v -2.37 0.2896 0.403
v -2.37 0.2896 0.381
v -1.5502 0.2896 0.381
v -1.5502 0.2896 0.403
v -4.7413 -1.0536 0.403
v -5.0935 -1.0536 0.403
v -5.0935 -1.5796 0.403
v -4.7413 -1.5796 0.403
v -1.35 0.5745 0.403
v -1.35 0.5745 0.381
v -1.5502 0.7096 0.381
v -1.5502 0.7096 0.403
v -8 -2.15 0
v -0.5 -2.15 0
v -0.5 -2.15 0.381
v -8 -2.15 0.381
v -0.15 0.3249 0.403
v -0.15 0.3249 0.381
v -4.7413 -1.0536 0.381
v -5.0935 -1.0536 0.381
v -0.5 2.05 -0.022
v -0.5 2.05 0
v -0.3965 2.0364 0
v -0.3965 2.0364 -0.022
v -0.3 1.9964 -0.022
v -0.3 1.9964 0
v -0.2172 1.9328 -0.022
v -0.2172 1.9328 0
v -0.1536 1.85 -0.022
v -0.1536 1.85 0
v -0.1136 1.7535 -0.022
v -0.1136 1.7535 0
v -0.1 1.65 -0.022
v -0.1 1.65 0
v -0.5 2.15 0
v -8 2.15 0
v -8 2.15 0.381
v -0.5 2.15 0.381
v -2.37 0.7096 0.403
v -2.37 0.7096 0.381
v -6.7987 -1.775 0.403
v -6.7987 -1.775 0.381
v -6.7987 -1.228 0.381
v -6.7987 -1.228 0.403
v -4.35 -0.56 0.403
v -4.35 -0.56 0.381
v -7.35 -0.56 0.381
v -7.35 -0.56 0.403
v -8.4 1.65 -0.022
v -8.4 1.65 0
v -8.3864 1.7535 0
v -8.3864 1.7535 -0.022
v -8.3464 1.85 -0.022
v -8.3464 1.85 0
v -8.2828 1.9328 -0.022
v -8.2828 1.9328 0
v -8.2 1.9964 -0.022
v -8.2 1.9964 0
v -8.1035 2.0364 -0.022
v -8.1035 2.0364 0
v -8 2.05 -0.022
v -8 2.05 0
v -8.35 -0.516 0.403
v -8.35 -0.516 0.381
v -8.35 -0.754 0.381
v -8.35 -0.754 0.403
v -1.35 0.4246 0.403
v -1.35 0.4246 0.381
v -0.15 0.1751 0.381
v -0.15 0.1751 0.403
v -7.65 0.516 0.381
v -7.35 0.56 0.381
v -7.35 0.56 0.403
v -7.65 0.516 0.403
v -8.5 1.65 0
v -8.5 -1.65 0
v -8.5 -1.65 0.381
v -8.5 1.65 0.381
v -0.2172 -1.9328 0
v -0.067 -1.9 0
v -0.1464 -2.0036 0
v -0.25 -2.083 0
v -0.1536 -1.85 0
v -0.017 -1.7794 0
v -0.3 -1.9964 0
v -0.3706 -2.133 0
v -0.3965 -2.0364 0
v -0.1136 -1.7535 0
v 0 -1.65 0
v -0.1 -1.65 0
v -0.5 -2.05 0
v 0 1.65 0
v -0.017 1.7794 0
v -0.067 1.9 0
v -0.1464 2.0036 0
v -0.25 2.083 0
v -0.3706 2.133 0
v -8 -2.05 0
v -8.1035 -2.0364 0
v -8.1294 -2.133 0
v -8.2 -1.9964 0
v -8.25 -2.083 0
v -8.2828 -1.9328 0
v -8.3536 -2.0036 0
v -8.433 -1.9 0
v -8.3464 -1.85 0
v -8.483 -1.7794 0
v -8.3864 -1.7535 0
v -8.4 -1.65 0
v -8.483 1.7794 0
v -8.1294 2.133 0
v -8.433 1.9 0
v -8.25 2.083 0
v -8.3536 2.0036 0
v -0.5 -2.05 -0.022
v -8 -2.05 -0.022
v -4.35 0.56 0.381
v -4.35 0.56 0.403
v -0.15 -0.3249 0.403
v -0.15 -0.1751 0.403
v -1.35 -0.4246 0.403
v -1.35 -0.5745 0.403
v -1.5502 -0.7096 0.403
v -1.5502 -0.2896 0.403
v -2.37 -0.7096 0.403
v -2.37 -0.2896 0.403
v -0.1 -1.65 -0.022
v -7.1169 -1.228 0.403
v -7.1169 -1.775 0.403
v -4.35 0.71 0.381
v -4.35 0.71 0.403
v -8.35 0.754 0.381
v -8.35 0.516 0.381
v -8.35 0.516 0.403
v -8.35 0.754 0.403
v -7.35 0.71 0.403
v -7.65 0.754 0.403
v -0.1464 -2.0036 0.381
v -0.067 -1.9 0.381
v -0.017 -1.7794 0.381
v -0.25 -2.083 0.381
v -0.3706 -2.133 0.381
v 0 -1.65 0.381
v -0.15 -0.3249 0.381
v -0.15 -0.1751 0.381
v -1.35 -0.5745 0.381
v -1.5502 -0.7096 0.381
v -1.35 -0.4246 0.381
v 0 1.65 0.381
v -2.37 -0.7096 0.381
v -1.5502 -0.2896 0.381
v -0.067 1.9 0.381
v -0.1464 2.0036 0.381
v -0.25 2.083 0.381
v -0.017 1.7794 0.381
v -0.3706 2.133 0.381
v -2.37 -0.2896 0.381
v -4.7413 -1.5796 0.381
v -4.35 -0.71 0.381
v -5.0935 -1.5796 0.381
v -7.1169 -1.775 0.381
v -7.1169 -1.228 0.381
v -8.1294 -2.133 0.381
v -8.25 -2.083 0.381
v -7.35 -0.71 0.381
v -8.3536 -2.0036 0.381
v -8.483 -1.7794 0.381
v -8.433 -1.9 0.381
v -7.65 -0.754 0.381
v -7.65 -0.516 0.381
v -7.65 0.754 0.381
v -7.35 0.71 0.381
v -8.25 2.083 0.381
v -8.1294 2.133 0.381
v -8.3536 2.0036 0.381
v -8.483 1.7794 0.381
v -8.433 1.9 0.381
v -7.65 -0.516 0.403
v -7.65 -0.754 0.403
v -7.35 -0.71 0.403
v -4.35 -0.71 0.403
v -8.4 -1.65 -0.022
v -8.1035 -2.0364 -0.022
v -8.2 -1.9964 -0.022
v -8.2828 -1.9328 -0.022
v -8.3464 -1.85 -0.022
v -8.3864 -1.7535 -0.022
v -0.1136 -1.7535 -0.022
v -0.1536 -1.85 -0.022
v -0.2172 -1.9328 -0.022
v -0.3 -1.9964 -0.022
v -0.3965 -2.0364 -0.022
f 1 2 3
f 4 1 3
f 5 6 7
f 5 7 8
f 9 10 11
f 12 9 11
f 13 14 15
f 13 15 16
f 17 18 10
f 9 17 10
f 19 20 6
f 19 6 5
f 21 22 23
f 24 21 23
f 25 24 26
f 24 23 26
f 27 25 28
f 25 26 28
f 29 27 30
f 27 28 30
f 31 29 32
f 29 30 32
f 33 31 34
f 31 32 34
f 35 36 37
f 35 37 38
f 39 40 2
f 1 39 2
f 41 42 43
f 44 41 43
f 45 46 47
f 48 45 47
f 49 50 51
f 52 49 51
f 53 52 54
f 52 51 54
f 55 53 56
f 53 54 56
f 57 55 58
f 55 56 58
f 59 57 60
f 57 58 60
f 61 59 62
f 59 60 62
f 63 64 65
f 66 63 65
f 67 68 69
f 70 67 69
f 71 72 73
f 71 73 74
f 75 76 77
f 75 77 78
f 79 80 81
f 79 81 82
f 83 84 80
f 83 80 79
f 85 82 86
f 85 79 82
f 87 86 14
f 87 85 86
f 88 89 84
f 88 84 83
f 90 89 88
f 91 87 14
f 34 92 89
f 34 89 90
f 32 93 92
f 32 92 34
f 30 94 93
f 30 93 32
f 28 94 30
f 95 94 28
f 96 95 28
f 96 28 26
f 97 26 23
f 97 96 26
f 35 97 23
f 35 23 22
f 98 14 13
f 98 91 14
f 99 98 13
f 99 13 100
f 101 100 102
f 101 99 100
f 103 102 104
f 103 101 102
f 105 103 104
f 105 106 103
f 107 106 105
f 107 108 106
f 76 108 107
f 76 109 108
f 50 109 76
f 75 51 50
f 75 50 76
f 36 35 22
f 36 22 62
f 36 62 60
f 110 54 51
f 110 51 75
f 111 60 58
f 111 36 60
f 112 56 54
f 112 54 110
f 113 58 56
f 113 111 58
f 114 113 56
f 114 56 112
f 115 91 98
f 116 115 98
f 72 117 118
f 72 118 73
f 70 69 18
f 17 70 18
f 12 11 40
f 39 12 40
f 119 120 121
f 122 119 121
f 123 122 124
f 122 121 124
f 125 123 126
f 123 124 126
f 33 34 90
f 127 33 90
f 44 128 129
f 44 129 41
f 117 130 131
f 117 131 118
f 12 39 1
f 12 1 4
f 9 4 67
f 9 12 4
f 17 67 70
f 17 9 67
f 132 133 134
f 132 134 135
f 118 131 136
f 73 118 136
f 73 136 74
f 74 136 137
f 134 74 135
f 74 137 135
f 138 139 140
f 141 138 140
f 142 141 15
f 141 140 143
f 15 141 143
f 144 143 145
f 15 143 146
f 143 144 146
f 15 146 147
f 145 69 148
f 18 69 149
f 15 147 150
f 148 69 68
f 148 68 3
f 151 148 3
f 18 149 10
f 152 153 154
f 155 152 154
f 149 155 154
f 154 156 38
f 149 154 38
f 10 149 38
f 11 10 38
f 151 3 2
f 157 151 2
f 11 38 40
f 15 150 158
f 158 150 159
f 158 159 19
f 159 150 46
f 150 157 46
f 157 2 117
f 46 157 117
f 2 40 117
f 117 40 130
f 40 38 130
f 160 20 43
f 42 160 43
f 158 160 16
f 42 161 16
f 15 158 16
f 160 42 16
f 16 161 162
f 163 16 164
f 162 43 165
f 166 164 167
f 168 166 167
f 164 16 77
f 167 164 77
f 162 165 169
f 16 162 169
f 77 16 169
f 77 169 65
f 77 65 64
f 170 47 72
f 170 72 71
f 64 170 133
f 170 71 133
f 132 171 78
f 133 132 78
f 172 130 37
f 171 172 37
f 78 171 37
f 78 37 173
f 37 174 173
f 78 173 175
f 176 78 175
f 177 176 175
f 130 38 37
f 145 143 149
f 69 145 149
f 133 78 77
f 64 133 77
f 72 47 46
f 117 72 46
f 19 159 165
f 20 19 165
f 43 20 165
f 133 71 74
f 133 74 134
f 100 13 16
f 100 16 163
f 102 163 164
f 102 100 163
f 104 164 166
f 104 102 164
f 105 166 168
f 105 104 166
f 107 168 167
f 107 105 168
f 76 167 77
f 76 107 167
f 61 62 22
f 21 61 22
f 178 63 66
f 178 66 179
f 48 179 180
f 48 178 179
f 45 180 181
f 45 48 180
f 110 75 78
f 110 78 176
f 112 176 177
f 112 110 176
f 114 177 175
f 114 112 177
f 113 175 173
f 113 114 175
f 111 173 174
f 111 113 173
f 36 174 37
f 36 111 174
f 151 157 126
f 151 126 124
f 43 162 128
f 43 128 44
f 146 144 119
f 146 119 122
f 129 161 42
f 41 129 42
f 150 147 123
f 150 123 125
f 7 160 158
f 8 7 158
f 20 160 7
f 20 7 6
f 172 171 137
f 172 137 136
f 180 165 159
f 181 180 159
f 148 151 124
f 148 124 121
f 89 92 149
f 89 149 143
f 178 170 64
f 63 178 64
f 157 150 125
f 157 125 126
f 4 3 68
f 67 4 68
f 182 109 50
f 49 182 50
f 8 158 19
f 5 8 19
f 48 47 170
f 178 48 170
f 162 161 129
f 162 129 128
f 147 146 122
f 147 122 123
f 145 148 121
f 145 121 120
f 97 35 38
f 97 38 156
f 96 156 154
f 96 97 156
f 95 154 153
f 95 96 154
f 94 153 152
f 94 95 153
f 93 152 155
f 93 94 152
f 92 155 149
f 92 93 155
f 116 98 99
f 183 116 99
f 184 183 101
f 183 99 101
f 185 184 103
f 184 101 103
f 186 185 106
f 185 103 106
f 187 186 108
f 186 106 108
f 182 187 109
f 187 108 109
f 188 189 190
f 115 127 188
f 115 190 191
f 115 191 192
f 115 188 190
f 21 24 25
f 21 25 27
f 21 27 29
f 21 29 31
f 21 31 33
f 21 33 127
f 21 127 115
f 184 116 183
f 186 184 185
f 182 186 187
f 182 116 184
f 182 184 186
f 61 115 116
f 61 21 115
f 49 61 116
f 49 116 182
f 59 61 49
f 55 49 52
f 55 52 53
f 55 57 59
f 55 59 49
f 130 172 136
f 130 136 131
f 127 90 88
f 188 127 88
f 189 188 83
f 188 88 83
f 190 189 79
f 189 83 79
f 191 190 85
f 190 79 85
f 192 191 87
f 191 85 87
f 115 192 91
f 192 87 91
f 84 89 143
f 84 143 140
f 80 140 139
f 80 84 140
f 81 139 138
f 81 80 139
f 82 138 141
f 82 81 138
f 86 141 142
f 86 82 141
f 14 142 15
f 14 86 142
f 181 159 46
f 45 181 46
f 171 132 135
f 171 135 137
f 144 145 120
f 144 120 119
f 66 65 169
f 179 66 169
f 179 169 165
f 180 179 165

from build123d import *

# Parameters (mm, degrees)
BE_00_BOARD_DEPTH   = 0.381
SKETCH2_W           = 0.318200966
SKETCH2_H           = 0.54698776
SKETCH2_W_2         = 0.352186611
SKETCH2_H_2         = 0.526038031
BE_00_TRACES_DEPTH  = 0.022
BOSS_EXTRUDE1_DEPTH = 0.022


with BuildPart() as part:
    # Sketch1 → BE-00 Board (new body)
    with BuildSketch(Plane.XY):
        with BuildLine():
            Line((-8, 2.15), (-0.5, 2.15))
            ThreePointArc((-0.5, 2.15), (-0.146446609, 2.003553391), (0, 1.65))
            Line((0, 1.65), (0, -1.65))
            ThreePointArc((0, -1.65), (-0.146446609, -2.003553391), (-0.5, -2.15))
            Line((-0.5, -2.15), (-8, -2.15))
            ThreePointArc((-8, -2.15), (-8.353553391, -2.003553391), (-8.5, -1.65))
            Line((-8.5, -1.65), (-8.5, 1.65))
            ThreePointArc((-8.5, 1.65), (-8.353553391, 2.003553391), (-8, 2.15))
        make_face()
    extrude(amount=BE_00_BOARD_DEPTH)

    # Sketch2 → BE-00 Traces (add)
    with BuildSketch(Plane.XY.offset(0.381)):
        Polygon((-0.15, -0.17507), (-0.15, -0.32493), (-1.35, -0.57449), (-1.55024951, -0.70956), (-2.37, -0.70956), (-2.37, -0.28956), (-1.55024951, -0.28956), (-1.35, -0.42463), align=None)
        Polygon((-4.35, -0.56), (-7.35, -0.56), (-7.65, -0.516), (-8.35, -0.516), (-8.35, -0.754), (-7.65, -0.754), (-7.35, -0.71), (-4.35, -0.71), align=None)
        Polygon((-4.35, 0.71), (-4.35, 0.56), (-7.35, 0.56), (-7.65, 0.516), (-8.35, 0.516), (-8.35, 0.754), (-7.65, 0.754), (-7.35, 0.71), align=None)
        Polygon((-1.35, 0.42463), (-0.15, 0.17507), (-0.15, 0.32493), (-1.35, 0.57449), (-1.55024951, 0.70956), (-2.37, 0.70956), (-2.37, 0.28956), (-1.55024951, 0.28956), align=None)
        with Locations((-6.957835324, -1.501500363)):
            Rectangle(SKETCH2_W, SKETCH2_H)
        with Locations((-4.91735677, -1.316593308)):
            Rectangle(SKETCH2_W_2, SKETCH2_H_2)
    extrude(amount=BE_00_TRACES_DEPTH)

    # Sketch4 → Boss-Extrude1 (add)
    with BuildSketch(Plane(origin=(0, 0, 0), x_dir=(-1, 0, 0), z_dir=(0, 0, -1))):
        with BuildLine():
            Line((0.5, -2.05), (8, -2.05))
            ThreePointArc((8, -2.05), (8.282842712, -1.932842712), (8.4, -1.65))
            Line((8.4, -1.65), (8.4, 1.65))
            ThreePointArc((8.4, 1.65), (8.282842712, 1.932842712), (8, 2.05))
            Line((8, 2.05), (0.5, 2.05))
            ThreePointArc((0.5, 2.05), (0.217157288, 1.932842712), (0.1, 1.65))
            Line((0.1, 1.65), (0.1, -1.65))
            ThreePointArc((0.1, -1.65), (0.217157288, -1.932842712), (0.5, -2.05))
        make_face()
    extrude(amount=BOSS_EXTRUDE1_DEPTH)


solid = part.part
